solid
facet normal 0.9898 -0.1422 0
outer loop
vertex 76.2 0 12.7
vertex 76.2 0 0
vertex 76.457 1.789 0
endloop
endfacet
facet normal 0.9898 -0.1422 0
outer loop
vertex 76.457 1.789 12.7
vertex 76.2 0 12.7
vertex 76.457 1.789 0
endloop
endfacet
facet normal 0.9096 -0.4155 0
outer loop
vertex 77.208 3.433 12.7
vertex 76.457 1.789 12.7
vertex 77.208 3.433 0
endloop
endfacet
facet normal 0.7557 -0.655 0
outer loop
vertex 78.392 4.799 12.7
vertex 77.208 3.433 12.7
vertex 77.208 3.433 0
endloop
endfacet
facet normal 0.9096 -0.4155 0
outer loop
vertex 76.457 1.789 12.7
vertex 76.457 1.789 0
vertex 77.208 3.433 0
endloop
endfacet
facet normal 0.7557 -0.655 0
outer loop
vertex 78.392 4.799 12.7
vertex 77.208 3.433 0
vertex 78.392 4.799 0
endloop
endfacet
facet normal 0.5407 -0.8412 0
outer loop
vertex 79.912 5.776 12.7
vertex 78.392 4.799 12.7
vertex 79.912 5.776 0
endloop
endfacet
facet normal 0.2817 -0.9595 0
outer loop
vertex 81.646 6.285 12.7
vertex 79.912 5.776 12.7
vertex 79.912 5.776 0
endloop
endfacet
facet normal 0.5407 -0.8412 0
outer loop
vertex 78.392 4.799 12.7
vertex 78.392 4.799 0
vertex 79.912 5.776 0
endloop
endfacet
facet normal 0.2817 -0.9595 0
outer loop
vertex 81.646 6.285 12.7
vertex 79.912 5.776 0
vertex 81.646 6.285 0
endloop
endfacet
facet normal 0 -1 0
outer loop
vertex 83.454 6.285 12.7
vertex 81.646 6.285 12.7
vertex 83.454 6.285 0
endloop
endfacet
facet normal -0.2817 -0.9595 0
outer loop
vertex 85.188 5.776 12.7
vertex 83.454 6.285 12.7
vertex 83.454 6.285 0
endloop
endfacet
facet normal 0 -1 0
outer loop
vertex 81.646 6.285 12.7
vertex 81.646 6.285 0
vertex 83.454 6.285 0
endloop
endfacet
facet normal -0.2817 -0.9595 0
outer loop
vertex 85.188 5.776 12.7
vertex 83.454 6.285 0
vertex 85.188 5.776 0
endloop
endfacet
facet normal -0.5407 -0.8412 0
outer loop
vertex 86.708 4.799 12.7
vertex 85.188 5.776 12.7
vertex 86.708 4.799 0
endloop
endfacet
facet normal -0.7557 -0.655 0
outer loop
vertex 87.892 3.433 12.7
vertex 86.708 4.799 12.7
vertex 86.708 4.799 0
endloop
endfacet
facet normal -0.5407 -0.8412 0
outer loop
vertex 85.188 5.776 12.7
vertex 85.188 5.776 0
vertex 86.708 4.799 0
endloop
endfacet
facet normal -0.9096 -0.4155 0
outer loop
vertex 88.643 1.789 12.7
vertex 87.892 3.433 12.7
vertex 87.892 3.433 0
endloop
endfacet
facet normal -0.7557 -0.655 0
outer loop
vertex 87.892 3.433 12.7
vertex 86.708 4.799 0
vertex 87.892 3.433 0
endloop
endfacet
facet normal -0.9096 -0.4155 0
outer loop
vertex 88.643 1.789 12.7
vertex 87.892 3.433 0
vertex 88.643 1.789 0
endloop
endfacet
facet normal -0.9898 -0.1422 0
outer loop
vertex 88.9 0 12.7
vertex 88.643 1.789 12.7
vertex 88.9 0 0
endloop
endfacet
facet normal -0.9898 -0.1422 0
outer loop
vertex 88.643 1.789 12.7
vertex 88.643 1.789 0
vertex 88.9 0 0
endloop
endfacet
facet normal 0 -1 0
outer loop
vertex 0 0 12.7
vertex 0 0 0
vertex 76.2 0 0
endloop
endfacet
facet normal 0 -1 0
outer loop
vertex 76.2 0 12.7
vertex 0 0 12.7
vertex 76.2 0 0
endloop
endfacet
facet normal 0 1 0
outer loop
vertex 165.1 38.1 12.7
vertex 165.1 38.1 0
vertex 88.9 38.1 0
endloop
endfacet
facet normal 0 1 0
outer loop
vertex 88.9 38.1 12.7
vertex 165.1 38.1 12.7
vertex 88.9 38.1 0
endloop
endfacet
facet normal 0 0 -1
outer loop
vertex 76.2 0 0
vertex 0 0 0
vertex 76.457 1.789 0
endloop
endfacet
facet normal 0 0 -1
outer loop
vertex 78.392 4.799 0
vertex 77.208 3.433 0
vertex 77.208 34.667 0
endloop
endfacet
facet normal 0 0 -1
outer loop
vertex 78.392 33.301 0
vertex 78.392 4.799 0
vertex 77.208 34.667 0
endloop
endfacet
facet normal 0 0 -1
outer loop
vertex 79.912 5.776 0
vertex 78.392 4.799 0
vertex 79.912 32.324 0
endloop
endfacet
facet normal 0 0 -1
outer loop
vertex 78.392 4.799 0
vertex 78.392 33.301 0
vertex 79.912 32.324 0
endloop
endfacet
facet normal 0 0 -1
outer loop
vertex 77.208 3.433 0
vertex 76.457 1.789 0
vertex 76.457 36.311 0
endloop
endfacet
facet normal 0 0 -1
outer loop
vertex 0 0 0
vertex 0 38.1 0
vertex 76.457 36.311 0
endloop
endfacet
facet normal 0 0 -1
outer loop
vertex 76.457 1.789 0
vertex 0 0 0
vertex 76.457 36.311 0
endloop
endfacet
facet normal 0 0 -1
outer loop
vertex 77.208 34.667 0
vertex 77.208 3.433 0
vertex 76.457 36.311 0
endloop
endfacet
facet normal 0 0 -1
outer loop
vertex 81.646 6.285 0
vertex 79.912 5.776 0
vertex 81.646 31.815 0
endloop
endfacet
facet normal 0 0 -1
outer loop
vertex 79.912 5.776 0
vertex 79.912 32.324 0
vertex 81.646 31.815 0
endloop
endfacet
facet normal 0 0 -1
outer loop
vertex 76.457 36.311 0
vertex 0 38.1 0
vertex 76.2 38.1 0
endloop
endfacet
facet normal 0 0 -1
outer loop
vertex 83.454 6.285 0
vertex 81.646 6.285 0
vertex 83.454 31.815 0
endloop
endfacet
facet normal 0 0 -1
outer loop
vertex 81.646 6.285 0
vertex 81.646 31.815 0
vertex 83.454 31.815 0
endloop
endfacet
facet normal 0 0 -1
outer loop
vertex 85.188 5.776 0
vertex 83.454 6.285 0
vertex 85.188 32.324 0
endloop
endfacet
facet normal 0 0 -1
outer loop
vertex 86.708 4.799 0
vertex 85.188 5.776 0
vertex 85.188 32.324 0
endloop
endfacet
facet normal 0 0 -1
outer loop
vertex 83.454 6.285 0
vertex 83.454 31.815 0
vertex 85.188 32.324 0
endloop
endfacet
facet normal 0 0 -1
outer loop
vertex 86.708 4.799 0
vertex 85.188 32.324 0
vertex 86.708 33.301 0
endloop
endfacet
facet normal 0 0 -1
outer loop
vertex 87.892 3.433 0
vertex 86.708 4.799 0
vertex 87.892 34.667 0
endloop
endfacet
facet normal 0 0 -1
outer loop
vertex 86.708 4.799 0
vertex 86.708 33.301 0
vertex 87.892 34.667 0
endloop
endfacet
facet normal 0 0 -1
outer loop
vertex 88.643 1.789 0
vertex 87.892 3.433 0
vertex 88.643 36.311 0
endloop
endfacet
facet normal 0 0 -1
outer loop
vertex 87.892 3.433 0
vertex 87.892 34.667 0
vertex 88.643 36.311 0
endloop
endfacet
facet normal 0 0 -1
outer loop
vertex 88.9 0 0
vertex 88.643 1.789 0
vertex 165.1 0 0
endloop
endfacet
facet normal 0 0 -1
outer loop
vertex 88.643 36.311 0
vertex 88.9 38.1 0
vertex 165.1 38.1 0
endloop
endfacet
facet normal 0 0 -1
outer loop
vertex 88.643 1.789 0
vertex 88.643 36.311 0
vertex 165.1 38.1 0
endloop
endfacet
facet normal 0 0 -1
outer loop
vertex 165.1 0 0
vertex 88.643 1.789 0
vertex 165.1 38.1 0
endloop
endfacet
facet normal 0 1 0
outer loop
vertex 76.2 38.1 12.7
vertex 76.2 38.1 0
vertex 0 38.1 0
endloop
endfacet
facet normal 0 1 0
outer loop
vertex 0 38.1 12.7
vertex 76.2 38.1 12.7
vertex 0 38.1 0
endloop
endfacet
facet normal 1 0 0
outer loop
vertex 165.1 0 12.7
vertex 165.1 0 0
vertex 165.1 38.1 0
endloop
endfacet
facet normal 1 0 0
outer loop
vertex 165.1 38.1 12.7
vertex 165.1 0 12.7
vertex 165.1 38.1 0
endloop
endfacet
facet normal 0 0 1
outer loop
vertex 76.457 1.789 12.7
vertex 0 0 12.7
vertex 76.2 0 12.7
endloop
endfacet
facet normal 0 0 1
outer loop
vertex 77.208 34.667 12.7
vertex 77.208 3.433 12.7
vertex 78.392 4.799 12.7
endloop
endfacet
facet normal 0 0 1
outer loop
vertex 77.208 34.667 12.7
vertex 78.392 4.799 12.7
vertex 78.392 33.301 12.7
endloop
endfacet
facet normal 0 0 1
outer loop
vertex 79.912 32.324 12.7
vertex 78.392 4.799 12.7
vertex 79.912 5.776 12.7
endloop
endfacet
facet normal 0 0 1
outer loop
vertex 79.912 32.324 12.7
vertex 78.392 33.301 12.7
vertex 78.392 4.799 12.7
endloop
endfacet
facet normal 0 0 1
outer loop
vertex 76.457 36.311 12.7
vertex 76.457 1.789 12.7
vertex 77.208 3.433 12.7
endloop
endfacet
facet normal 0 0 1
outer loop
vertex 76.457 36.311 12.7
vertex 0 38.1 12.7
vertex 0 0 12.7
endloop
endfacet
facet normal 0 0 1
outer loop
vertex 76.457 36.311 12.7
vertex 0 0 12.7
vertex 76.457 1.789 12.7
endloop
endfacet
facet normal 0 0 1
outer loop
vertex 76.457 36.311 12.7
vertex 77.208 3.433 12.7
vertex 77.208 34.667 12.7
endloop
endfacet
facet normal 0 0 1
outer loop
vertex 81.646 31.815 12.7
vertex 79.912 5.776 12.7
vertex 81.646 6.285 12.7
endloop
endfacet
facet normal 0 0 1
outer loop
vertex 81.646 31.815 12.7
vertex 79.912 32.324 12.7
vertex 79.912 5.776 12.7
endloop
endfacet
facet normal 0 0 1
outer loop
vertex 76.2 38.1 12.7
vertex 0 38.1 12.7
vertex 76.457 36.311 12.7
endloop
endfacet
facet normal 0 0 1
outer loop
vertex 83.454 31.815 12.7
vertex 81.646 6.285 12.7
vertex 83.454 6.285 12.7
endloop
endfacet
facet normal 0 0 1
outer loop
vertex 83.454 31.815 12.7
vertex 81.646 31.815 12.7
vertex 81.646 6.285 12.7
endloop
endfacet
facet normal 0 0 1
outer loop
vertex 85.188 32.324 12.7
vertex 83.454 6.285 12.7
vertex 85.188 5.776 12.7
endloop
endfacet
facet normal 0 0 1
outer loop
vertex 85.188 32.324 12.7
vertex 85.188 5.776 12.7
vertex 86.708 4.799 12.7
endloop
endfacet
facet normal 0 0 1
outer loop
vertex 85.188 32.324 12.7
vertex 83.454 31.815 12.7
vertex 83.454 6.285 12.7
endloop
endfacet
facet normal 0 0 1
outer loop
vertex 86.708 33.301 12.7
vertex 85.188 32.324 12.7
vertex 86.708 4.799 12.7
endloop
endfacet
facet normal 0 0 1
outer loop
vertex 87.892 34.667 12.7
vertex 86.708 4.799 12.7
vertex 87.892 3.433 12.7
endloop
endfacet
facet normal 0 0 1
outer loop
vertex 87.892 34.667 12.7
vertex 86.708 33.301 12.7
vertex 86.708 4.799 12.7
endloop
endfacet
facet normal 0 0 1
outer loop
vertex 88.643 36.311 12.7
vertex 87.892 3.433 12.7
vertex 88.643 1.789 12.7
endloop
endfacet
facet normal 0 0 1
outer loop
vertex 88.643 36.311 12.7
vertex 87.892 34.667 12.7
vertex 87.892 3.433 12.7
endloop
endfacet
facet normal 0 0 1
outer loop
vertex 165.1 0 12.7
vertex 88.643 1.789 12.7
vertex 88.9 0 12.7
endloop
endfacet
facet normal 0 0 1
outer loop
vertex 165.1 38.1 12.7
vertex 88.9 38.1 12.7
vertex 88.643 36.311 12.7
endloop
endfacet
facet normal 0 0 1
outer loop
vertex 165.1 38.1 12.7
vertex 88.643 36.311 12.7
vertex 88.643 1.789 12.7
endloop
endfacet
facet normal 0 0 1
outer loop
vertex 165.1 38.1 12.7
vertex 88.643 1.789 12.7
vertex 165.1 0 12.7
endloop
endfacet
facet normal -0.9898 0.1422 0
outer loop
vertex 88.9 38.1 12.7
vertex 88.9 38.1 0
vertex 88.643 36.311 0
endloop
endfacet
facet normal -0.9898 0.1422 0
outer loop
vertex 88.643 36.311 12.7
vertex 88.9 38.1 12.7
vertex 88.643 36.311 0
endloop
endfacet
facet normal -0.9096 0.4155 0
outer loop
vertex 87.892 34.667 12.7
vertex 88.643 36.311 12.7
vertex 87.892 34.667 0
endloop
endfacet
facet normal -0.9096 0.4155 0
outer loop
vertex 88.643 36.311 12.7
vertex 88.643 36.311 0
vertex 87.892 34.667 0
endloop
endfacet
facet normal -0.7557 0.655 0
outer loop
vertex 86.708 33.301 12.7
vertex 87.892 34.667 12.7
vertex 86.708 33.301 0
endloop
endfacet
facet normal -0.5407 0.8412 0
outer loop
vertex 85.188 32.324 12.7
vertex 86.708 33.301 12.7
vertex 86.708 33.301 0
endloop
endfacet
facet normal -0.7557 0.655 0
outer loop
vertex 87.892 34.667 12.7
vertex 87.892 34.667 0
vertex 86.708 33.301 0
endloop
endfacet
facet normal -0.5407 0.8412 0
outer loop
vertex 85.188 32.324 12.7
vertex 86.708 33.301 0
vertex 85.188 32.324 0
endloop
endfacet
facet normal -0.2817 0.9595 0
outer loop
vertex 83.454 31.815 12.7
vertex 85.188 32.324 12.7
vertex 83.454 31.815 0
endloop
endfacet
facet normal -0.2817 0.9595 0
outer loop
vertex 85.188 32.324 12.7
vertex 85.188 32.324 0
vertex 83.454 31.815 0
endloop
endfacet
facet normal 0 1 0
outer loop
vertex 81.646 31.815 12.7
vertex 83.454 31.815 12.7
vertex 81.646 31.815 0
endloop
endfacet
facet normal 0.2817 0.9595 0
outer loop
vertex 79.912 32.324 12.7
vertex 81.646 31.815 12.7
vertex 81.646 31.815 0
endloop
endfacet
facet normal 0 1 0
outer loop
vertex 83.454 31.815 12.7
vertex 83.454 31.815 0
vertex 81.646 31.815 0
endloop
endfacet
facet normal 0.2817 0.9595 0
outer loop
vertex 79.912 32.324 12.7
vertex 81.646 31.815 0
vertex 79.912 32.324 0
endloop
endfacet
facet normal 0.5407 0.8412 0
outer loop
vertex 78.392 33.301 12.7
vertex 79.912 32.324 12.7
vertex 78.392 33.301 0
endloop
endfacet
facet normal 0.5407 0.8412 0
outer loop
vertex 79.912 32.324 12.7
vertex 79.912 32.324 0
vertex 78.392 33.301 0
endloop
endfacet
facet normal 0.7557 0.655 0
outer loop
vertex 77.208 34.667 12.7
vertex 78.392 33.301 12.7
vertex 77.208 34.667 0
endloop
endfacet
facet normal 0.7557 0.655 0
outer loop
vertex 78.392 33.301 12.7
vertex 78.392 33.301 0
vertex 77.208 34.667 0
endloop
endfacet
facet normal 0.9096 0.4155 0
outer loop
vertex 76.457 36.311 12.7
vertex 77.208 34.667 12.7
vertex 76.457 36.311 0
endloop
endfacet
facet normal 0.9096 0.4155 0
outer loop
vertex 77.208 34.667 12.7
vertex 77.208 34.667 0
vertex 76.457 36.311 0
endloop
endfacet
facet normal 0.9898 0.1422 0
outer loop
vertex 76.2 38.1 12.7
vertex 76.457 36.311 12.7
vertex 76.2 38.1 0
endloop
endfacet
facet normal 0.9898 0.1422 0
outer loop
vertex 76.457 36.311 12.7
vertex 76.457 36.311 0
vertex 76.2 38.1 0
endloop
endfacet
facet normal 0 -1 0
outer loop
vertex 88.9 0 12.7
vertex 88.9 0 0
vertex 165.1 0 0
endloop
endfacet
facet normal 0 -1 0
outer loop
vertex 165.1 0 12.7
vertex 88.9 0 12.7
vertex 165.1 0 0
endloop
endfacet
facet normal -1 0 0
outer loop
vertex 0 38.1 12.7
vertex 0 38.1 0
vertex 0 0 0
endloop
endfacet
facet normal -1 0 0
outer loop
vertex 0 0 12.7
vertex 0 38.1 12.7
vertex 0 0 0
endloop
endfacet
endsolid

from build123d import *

# Parameters (mm, degrees)
EXTRUDE1_DEPTH = 12.7


with BuildPart() as part:
    # Sketch1 → Extrude1 (new body)
    with BuildSketch(Plane.XY):
        with BuildLine():
            Line((0, 0), (76.2, 0))
            ThreePointArc((76.2, 0), (82.55, 6.35), (88.9, 0))
            Line((88.9, 0), (165.1, 0))
            Line((165.1, 0), (165.1, 38.1))
            Line((165.1, 38.1), (88.9, 38.1))
            ThreePointArc((88.9, 38.1), (82.55, 31.75), (76.2, 38.1))
            Line((76.2, 38.1), (0, 38.1))
            Line((0, 38.1), (0, 0))
        make_face()
    extrude(amount=EXTRUDE1_DEPTH)


solid = part.part
